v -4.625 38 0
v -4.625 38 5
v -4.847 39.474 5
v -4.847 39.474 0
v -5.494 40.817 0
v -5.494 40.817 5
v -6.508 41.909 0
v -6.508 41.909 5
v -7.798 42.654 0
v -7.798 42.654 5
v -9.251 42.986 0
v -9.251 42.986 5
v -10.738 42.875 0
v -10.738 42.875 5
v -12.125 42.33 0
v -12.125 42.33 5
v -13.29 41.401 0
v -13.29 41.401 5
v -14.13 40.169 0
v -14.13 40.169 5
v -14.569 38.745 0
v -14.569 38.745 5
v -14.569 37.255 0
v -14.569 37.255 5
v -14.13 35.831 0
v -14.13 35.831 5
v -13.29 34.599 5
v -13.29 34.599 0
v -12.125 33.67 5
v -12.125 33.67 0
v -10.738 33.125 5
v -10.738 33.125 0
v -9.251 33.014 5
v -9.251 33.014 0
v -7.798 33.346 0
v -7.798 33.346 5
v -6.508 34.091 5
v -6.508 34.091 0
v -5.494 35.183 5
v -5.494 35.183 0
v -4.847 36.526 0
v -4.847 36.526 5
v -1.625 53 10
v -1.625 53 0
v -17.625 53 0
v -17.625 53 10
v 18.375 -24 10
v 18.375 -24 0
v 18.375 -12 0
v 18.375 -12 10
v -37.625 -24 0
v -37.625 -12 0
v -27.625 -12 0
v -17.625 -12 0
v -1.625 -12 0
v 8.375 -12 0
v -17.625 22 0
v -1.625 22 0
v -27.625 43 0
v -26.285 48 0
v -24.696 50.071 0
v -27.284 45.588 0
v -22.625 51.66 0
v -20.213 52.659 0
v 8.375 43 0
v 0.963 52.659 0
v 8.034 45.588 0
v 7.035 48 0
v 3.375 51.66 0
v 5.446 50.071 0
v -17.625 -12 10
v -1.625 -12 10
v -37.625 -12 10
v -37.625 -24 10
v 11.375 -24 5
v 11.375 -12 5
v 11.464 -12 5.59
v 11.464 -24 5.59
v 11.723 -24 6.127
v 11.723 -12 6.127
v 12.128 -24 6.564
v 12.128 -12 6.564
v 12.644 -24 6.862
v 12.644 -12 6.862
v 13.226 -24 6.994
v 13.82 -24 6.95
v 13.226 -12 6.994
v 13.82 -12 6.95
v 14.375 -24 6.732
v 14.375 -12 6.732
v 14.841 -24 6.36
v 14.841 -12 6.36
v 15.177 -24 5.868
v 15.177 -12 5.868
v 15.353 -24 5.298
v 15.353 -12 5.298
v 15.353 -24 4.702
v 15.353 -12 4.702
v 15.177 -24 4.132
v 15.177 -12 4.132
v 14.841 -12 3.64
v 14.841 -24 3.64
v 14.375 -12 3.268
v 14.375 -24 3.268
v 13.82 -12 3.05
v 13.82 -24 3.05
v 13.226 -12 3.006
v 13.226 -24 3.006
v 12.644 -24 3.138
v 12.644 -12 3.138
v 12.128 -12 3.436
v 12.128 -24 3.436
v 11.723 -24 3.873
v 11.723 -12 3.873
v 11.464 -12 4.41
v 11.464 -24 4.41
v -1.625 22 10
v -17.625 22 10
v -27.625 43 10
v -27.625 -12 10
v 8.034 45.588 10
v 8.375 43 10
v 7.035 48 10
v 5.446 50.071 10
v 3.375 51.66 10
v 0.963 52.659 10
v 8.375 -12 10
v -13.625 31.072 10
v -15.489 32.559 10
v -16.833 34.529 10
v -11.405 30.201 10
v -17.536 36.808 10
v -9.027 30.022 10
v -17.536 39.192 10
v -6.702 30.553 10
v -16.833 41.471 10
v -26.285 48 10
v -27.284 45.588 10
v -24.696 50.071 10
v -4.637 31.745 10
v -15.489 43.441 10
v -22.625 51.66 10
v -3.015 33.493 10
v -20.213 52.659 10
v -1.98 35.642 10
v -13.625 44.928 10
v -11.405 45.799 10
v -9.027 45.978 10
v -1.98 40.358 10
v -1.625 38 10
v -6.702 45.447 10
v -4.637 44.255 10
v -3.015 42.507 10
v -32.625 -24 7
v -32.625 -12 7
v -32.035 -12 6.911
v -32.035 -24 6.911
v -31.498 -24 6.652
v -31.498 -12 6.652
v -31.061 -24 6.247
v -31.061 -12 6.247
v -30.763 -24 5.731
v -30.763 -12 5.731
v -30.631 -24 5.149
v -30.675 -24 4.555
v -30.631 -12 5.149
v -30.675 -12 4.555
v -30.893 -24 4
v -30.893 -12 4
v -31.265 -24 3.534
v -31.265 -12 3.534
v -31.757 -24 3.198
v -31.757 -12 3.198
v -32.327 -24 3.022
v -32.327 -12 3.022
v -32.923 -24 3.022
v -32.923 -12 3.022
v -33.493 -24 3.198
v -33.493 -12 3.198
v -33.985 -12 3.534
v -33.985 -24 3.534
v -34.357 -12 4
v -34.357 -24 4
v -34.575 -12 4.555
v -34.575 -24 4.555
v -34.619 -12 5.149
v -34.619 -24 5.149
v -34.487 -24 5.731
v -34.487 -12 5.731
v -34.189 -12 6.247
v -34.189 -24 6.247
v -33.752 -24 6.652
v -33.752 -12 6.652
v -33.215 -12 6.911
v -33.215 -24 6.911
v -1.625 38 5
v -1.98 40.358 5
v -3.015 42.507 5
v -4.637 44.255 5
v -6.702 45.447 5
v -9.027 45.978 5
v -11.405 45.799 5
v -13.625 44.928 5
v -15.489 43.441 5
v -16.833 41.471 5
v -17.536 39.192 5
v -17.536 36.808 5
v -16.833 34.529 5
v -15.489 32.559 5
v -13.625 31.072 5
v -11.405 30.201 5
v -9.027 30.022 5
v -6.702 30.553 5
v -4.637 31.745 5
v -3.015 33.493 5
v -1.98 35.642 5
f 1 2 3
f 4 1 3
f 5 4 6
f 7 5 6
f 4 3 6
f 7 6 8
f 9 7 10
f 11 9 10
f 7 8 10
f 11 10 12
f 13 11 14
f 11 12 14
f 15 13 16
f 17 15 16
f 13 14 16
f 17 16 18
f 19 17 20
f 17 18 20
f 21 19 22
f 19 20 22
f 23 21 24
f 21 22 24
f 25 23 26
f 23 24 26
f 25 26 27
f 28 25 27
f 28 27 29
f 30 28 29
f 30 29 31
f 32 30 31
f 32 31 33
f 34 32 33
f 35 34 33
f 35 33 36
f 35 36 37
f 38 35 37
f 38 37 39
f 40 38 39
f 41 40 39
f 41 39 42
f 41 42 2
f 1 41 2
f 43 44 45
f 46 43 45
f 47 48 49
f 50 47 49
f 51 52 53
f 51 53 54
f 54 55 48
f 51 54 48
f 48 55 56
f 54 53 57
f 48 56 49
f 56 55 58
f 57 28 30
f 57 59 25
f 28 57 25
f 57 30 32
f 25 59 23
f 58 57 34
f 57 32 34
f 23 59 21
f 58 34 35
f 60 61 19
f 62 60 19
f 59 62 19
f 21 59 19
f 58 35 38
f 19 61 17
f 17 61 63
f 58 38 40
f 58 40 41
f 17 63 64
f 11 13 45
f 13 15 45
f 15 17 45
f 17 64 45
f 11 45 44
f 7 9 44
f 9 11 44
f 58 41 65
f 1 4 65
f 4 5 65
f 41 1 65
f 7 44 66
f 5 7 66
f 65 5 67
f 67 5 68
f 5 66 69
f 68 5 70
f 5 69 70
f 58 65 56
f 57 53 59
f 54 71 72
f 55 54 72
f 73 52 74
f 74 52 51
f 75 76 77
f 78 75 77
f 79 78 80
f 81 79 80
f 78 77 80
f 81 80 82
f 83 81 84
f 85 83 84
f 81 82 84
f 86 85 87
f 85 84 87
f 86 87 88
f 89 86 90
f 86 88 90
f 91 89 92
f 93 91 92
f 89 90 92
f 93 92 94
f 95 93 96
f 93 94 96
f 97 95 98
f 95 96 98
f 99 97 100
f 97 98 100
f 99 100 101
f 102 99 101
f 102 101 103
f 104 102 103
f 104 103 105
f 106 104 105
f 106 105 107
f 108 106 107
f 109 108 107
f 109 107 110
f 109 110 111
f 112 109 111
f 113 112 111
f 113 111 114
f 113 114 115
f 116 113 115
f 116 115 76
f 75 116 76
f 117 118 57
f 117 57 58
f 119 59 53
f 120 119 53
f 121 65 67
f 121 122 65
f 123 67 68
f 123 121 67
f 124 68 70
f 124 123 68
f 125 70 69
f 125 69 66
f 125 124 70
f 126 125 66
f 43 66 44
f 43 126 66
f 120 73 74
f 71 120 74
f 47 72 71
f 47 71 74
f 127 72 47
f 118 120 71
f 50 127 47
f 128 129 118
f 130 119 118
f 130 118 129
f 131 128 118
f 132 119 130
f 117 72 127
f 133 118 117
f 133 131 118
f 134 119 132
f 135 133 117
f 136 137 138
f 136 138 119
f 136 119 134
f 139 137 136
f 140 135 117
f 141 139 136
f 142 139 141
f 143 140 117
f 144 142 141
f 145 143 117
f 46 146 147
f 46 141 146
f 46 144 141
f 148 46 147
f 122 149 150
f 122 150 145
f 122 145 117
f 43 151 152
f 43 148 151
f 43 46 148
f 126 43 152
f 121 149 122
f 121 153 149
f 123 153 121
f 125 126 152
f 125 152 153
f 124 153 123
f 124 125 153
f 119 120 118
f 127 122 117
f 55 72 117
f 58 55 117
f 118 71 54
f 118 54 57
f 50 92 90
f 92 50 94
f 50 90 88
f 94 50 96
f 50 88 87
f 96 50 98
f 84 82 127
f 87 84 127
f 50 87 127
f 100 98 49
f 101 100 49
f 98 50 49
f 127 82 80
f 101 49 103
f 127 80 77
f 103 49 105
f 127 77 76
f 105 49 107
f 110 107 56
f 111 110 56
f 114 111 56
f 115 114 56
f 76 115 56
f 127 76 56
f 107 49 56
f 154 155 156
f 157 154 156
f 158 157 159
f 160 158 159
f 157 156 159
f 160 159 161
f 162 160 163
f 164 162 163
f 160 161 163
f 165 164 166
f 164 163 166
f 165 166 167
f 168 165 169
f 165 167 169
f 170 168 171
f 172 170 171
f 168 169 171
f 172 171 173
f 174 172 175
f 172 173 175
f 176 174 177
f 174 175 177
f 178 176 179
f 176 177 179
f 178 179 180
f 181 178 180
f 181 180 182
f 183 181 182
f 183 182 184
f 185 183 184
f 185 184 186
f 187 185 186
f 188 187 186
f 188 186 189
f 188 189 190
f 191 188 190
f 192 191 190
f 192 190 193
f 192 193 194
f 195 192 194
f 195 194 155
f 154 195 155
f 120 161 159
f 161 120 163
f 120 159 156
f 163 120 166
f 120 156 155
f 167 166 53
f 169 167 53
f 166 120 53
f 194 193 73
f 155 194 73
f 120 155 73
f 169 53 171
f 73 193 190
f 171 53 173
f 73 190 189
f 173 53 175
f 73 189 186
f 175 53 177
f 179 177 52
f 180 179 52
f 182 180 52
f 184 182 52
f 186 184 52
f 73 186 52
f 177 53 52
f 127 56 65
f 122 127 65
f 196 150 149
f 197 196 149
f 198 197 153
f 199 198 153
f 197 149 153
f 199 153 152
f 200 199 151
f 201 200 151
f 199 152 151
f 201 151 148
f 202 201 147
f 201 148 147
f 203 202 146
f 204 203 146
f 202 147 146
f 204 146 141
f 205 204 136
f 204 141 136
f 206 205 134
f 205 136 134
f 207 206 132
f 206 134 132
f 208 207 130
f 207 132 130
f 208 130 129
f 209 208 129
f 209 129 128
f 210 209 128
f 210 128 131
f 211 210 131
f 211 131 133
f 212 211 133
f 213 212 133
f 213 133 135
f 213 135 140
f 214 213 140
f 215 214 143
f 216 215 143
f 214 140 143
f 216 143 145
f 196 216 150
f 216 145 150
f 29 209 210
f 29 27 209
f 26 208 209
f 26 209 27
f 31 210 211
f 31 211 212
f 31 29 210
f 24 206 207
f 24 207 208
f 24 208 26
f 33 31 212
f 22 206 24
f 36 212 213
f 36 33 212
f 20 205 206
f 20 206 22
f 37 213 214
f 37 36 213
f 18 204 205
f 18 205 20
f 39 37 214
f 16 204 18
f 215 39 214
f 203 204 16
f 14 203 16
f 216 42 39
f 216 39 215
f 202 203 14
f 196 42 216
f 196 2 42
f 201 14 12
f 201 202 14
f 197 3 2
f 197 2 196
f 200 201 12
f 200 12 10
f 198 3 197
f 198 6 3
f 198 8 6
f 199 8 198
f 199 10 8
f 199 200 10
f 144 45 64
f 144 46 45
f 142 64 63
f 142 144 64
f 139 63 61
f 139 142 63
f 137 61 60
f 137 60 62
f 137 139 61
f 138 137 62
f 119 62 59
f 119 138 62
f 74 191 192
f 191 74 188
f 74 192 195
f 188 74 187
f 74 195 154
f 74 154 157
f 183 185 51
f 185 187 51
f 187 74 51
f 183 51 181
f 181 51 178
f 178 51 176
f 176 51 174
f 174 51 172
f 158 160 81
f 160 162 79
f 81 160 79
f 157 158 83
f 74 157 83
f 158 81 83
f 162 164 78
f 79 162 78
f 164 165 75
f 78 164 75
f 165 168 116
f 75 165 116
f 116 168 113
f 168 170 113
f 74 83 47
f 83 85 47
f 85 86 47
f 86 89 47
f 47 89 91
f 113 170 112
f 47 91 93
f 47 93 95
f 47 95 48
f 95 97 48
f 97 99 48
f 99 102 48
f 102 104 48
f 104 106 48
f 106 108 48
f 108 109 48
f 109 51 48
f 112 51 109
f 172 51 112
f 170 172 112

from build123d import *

# Parameters (mm, degrees)
BOSS_EXTRUDE1_DEPTH = 10
SKETCH2_R           = 8
CUT_EXTRUDE1_DEPTH  = 5
FILLET1_R           = 10
SKETCH4_R           = 2
CUT_EXTRUDE3_DEPTH  = 22
SKETCH5_R           = 2
CUT_EXTRUDE4_DEPTH  = 23
SKETCH6_R           = 5
CUT_EXTRUDE5_DEPTH  = 10
SKETCH8_W           = 16
SKETCH8_H           = 34
CUT_EXTRUDE7_DEPTH  = 10


with BuildPart() as part:
    # Sketch1 → Boss-Extrude1 (new body)
    with BuildSketch(Plane.XY):
        Polygon((-37.625, -24), (18.375, -24), (18.375, -12), (8.375, -12), (8.375, 53), (-27.625, 53), (-27.625, -12), (-37.625, -12), align=None)
    extrude(amount=BOSS_EXTRUDE1_DEPTH)

    # Sketch2 → Cut-Extrude1 (cut)
    with BuildSketch(Plane.XY.offset(10)):
        with Locations((-9.625, 38)):
            Circle(SKETCH2_R)
    extrude(amount=-CUT_EXTRUDE1_DEPTH, mode=Mode.SUBTRACT)

    # Fillet1
    fillet1_edges = [part.edges().sort_by_distance(p)[0] for p in [
        (-27.625, 53, 5),
        (8.375, 53, 5),
    ]]
    fillet(fillet1_edges, radius=FILLET1_R)

    # Sketch4 → Cut-Extrude3 (cut)
    with BuildSketch(Plane(origin=(0, -12, 0), x_dir=(1, 0, 0), z_dir=(0, 1, 0))):
        with Locations((13.375, -5)):
            Circle(SKETCH4_R)
    extrude(amount=-CUT_EXTRUDE3_DEPTH, mode=Mode.SUBTRACT)

    # Sketch5 → Cut-Extrude4 (cut)
    with BuildSketch(Plane(origin=(0, -12, 0), x_dir=(1, 0, 0), z_dir=(0, 1, 0))):
        with Locations((-32.625, -5)):
            Circle(SKETCH5_R)
    extrude(amount=-CUT_EXTRUDE4_DEPTH, mode=Mode.SUBTRACT)

    # Sketch6 → Cut-Extrude5 (cut)
    with BuildSketch(Plane.XY.offset(5)):
        with Locations((-9.625, 38)):
            Circle(SKETCH6_R)
    extrude(amount=-CUT_EXTRUDE5_DEPTH, mode=Mode.SUBTRACT)

    # Sketch8 → Cut-Extrude7 (cut)
    with BuildSketch(Plane.XY.offset(10)):
        with Locations((-9.625, 5)):
            Rectangle(SKETCH8_W, SKETCH8_H)
    extrude(amount=-CUT_EXTRUDE7_DEPTH, mode=Mode.SUBTRACT)


solid = part.part
